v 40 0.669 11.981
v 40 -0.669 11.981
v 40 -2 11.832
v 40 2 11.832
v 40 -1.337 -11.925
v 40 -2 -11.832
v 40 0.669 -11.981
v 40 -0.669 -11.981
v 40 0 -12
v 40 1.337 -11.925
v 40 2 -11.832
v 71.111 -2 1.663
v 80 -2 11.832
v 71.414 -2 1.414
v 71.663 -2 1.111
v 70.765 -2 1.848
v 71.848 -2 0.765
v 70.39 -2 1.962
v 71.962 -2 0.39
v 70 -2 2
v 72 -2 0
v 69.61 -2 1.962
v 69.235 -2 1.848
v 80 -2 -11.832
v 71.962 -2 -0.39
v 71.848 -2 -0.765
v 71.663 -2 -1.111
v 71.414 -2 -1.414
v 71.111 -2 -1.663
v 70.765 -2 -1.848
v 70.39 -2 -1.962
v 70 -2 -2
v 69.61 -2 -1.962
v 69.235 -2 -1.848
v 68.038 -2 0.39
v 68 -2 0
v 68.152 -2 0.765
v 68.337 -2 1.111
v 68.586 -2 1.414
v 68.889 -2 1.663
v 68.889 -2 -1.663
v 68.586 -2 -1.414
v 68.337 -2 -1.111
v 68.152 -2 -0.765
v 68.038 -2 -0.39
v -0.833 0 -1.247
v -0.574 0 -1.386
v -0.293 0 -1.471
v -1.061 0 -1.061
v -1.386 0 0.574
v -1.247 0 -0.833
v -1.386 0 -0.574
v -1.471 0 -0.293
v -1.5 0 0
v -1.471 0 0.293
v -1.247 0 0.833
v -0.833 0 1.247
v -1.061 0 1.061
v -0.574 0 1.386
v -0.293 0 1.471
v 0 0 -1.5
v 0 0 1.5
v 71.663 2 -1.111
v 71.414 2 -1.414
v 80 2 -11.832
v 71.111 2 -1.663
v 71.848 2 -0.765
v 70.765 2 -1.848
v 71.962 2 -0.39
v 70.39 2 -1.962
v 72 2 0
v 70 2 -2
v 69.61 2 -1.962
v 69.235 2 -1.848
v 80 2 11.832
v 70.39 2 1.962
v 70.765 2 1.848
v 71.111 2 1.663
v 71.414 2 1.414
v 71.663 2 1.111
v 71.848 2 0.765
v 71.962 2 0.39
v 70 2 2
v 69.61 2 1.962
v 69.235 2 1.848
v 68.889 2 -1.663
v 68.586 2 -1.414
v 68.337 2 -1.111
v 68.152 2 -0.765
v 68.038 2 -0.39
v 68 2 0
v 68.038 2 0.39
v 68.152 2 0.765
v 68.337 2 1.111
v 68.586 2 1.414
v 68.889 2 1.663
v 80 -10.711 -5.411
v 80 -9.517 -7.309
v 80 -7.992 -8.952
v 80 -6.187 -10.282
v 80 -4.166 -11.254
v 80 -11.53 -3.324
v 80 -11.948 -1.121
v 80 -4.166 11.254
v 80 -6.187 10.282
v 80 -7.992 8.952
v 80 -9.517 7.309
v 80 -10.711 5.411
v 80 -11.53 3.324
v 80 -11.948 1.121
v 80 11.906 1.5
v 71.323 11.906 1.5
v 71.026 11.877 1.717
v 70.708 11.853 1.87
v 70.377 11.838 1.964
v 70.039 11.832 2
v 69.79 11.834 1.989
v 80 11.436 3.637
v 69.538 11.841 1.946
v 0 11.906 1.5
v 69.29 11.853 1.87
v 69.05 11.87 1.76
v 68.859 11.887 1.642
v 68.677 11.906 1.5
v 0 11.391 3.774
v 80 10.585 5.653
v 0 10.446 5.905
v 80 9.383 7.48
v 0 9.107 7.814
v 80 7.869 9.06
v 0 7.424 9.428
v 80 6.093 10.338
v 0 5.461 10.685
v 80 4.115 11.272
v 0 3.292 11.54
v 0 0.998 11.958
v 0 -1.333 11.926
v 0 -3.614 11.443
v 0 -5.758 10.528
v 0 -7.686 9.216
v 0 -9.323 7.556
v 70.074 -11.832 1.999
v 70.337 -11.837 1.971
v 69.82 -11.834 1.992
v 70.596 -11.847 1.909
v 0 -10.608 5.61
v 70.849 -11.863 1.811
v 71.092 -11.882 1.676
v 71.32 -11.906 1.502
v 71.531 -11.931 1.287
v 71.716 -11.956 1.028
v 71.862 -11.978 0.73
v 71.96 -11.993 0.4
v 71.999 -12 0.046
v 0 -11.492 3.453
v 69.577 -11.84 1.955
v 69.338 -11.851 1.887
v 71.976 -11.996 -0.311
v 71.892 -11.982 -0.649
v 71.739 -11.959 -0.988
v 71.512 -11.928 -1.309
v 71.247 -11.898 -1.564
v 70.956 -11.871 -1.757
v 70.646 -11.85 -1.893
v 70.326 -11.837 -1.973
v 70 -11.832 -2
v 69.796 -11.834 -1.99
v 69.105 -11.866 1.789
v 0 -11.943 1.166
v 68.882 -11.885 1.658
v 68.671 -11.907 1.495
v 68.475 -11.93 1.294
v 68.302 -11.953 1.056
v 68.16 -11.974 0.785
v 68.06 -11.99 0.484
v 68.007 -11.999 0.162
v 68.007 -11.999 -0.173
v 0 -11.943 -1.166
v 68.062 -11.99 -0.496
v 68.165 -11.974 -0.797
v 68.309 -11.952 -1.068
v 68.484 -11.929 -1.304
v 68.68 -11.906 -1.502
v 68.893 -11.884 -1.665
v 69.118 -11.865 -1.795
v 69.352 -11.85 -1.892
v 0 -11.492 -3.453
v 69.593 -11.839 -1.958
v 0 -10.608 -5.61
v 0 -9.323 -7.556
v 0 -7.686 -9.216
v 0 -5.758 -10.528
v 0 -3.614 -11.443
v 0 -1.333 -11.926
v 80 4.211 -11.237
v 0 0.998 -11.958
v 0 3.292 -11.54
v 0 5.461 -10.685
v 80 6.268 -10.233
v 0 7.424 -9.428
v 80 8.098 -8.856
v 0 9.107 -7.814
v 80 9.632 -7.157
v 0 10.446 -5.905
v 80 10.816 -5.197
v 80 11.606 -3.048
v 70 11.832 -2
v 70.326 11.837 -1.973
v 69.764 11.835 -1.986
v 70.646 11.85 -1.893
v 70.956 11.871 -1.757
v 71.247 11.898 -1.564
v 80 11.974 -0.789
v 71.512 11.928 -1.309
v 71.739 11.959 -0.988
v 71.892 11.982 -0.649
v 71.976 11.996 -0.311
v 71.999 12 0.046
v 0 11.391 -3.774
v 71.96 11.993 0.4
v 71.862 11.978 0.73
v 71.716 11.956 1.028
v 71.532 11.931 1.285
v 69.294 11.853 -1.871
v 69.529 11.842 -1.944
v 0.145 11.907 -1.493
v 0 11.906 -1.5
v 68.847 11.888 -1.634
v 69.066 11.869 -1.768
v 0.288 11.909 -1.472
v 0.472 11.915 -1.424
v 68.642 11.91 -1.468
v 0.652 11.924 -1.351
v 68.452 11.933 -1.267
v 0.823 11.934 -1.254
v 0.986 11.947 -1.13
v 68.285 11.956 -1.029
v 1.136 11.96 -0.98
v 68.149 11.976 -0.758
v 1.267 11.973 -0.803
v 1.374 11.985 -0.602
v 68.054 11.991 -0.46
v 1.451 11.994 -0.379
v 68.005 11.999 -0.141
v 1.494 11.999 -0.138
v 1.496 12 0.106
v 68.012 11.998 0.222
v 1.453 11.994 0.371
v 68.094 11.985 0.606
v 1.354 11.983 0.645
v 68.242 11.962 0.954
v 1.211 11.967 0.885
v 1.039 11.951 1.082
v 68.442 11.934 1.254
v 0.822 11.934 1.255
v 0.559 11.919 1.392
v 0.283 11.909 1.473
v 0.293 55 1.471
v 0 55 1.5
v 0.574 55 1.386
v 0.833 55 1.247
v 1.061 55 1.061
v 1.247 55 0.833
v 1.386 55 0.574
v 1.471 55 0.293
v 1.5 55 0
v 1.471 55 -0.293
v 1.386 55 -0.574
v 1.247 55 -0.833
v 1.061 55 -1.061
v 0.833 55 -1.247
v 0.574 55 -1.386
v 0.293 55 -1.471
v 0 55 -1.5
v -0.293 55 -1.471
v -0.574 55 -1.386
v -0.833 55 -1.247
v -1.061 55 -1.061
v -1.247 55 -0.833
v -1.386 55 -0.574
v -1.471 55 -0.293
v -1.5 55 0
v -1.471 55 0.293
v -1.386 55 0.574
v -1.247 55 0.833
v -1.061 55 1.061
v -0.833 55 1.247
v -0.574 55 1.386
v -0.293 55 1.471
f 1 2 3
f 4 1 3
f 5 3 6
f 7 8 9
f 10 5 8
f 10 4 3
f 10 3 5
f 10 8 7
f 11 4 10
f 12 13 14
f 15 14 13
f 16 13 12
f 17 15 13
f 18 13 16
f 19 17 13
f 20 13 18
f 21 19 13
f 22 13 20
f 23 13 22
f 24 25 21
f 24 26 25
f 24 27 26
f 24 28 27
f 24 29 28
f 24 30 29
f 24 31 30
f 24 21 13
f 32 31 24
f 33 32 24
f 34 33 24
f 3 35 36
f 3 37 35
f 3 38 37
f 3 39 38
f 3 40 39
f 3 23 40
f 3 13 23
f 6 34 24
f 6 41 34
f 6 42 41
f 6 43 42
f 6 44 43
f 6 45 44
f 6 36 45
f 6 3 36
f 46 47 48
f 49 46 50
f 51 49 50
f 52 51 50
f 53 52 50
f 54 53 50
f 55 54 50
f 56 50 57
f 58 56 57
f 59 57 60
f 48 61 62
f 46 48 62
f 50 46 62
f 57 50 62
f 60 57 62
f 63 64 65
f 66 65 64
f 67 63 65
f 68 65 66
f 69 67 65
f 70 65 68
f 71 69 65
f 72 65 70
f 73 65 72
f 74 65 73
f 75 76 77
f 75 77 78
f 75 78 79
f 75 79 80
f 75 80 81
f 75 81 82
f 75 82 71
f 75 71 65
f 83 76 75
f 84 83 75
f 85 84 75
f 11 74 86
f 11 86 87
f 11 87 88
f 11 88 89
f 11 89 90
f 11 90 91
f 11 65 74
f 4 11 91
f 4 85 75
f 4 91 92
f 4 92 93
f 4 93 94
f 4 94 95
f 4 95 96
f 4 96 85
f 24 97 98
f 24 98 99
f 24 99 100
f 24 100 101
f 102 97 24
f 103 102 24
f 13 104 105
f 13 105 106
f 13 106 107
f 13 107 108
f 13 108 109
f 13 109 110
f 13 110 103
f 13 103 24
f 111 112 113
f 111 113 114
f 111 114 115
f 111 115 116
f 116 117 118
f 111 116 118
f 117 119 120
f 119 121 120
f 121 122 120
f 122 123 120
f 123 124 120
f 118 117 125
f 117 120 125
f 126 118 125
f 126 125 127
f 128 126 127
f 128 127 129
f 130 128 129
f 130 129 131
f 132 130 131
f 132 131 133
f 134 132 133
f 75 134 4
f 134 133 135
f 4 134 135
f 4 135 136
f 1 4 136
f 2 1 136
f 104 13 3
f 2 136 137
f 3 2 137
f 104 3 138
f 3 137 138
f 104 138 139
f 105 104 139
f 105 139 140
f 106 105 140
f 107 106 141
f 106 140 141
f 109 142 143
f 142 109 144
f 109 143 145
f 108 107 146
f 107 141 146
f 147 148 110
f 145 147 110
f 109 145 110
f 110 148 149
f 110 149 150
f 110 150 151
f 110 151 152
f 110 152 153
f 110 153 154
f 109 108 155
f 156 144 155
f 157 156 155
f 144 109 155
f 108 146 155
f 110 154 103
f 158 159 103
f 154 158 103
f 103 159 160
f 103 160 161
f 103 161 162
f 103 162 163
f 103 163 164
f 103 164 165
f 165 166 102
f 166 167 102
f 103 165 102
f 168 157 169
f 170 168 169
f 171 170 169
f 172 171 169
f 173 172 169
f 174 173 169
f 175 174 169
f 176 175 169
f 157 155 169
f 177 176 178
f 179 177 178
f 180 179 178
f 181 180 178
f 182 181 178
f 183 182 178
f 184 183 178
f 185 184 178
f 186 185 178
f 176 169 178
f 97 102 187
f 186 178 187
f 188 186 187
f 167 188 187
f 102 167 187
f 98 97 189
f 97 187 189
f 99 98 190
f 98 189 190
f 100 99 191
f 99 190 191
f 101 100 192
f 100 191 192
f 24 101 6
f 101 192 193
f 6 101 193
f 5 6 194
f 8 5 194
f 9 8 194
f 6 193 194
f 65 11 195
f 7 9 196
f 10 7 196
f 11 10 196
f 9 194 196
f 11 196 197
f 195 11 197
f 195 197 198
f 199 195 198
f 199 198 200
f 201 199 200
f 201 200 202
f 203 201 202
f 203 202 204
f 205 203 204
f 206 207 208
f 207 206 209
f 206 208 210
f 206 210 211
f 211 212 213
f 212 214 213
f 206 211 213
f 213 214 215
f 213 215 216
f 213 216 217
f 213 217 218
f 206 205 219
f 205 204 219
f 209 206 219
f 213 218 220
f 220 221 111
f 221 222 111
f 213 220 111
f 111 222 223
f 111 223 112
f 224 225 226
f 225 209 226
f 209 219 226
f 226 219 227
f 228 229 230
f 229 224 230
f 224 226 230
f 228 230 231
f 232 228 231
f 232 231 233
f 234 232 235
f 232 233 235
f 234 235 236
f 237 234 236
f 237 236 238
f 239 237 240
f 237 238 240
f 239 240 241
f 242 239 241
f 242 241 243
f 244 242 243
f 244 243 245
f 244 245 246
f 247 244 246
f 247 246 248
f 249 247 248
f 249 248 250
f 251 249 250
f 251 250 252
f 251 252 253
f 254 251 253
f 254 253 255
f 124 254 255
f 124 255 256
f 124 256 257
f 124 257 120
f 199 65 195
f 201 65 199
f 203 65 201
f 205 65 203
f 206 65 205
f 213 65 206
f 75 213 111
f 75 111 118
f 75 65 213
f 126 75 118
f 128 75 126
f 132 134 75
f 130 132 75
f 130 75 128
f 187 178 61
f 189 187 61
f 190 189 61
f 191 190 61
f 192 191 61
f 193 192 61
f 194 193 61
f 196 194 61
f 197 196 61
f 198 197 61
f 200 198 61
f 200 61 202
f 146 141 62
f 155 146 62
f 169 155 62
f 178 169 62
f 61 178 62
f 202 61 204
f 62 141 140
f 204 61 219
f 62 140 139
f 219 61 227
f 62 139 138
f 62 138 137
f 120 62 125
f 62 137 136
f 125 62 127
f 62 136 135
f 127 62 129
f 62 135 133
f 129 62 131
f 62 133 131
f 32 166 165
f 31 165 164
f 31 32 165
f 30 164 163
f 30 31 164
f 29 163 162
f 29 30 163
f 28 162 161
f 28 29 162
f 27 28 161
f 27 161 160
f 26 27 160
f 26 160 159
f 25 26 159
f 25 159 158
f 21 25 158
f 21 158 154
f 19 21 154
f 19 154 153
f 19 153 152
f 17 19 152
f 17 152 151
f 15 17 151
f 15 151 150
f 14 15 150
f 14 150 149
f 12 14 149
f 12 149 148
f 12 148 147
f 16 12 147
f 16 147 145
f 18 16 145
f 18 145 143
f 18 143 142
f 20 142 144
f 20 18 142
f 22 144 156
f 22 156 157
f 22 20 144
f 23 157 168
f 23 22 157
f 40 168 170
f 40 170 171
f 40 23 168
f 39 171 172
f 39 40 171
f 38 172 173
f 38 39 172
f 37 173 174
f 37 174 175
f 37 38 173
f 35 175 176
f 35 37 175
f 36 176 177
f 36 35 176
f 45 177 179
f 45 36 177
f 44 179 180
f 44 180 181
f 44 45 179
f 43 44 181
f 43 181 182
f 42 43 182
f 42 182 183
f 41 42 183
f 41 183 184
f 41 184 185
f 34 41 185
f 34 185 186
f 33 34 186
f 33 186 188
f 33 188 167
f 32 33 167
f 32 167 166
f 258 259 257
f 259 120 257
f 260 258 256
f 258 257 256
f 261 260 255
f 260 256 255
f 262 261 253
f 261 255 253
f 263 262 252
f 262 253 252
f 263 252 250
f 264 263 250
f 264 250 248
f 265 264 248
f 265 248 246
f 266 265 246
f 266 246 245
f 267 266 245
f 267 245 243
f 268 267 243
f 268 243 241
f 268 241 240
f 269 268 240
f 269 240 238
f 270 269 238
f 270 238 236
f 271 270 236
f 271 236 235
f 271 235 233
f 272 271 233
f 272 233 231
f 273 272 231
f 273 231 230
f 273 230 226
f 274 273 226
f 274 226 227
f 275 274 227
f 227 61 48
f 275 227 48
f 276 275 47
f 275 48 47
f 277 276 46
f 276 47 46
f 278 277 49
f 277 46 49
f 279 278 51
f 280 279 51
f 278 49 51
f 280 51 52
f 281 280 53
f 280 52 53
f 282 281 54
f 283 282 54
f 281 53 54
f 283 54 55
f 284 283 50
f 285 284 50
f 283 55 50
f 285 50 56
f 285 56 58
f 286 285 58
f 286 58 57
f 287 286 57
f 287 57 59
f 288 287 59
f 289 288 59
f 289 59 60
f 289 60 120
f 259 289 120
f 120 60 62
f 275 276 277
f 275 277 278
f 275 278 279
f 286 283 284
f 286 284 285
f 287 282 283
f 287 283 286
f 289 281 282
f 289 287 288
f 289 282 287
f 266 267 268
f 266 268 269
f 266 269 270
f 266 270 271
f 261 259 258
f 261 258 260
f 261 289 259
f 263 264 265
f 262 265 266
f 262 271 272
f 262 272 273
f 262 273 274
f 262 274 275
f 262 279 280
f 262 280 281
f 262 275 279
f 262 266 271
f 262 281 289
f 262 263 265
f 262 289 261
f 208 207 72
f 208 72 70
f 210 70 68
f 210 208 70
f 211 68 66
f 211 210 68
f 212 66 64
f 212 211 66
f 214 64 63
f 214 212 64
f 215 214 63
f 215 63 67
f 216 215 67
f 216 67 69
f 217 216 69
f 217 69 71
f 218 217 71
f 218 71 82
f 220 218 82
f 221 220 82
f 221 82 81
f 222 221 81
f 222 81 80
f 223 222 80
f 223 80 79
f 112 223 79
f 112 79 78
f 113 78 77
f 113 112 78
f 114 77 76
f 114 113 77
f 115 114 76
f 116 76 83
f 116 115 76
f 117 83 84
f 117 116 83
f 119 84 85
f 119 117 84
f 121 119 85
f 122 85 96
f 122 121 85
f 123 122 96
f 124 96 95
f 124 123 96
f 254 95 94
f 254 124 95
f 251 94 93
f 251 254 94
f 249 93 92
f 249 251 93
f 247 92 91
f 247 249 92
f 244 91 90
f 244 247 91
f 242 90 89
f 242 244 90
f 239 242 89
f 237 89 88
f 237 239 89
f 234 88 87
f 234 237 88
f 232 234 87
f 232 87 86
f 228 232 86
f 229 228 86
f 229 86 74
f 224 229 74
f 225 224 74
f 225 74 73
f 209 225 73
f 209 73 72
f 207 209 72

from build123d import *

# Parameters (mm, degrees)
SKETCH_1_R               = 1.5
EXTRUDE_1_DEPTH          = 55
SKETCH_2_R               = 12
EXTRUDE_2_DEPTH          = 80
CUT_EXTRUDE_START        = -40
CUT_EXTRUDE_1_DEPTH      = 40
CUT_EXTRUDE_2_DEPTH      = 97.710909566
CUT_EXTRUDE_2_DEPTH_BACK = 97.710909566
SKETCH_5_R               = 2


with BuildPart() as part:
    # 草图1 → 凸台-拉伸1 (new body)
    with BuildSketch(Plane(origin=(0, 0, 0), x_dir=(1, 0, 0), z_dir=(0, 1, 0))):
        with Locations(Location((0, 0, 0), (0, 0, 270))):
            Circle(SKETCH_1_R)
    extrude(amount=EXTRUDE_1_DEPTH)

    # 草图2 → 凸台-拉伸2 (add)
    with BuildSketch(Plane(origin=(0, 0, 0), x_dir=(0, 0, -1), z_dir=(1, 0, 0))):
        with Locations(Location((0, 0, 0), (0, 0, 97.180755781))):
            Circle(SKETCH_2_R)
    extrude(amount=EXTRUDE_2_DEPTH)

    # 草图4 → 切除-拉伸1 (cut)
    with BuildSketch(Plane(origin=(80, 0, 0), x_dir=(0, 0, -1), z_dir=(1, 0, 0)).offset(CUT_EXTRUDE_START)):
        with BuildLine():
            Line((-11.832159566, -2), (-10.908712115, -2))
            Line((-10.908712115, -2), (10.908712115, -2))
            Line((10.908712115, -2), (11.832159566, -2))
            ThreePointArc((11.832159566, -2), (11.957966273, -1.003515123), (12, 0))
            ThreePointArc((12, 0), (11.957966273, 1.003515123), (11.832159566, 2))
            Line((11.832159566, 2), (-6.712374636, 2))
            Line((-6.712374636, 2), (-11.832159566, 2))
            ThreePointArc((-11.832159566, 2), (-12, 0), (-11.832159566, -2))
        make_face()
    extrude(amount=CUT_EXTRUDE_1_DEPTH, mode=Mode.SUBTRACT)

    # 草图5 → 切除-拉伸2 (cut, two sides: drawn at the far end of the back side and taken through both)
    with BuildSketch(Plane.XZ.offset(-2).offset(-CUT_EXTRUDE_2_DEPTH_BACK)):
        with Locations(Location((70, 0, 0), (0, 0, 270))):
            Circle(SKETCH_5_R)
    extrude(amount=CUT_EXTRUDE_2_DEPTH + CUT_EXTRUDE_2_DEPTH_BACK, mode=Mode.SUBTRACT)


solid = part.part
